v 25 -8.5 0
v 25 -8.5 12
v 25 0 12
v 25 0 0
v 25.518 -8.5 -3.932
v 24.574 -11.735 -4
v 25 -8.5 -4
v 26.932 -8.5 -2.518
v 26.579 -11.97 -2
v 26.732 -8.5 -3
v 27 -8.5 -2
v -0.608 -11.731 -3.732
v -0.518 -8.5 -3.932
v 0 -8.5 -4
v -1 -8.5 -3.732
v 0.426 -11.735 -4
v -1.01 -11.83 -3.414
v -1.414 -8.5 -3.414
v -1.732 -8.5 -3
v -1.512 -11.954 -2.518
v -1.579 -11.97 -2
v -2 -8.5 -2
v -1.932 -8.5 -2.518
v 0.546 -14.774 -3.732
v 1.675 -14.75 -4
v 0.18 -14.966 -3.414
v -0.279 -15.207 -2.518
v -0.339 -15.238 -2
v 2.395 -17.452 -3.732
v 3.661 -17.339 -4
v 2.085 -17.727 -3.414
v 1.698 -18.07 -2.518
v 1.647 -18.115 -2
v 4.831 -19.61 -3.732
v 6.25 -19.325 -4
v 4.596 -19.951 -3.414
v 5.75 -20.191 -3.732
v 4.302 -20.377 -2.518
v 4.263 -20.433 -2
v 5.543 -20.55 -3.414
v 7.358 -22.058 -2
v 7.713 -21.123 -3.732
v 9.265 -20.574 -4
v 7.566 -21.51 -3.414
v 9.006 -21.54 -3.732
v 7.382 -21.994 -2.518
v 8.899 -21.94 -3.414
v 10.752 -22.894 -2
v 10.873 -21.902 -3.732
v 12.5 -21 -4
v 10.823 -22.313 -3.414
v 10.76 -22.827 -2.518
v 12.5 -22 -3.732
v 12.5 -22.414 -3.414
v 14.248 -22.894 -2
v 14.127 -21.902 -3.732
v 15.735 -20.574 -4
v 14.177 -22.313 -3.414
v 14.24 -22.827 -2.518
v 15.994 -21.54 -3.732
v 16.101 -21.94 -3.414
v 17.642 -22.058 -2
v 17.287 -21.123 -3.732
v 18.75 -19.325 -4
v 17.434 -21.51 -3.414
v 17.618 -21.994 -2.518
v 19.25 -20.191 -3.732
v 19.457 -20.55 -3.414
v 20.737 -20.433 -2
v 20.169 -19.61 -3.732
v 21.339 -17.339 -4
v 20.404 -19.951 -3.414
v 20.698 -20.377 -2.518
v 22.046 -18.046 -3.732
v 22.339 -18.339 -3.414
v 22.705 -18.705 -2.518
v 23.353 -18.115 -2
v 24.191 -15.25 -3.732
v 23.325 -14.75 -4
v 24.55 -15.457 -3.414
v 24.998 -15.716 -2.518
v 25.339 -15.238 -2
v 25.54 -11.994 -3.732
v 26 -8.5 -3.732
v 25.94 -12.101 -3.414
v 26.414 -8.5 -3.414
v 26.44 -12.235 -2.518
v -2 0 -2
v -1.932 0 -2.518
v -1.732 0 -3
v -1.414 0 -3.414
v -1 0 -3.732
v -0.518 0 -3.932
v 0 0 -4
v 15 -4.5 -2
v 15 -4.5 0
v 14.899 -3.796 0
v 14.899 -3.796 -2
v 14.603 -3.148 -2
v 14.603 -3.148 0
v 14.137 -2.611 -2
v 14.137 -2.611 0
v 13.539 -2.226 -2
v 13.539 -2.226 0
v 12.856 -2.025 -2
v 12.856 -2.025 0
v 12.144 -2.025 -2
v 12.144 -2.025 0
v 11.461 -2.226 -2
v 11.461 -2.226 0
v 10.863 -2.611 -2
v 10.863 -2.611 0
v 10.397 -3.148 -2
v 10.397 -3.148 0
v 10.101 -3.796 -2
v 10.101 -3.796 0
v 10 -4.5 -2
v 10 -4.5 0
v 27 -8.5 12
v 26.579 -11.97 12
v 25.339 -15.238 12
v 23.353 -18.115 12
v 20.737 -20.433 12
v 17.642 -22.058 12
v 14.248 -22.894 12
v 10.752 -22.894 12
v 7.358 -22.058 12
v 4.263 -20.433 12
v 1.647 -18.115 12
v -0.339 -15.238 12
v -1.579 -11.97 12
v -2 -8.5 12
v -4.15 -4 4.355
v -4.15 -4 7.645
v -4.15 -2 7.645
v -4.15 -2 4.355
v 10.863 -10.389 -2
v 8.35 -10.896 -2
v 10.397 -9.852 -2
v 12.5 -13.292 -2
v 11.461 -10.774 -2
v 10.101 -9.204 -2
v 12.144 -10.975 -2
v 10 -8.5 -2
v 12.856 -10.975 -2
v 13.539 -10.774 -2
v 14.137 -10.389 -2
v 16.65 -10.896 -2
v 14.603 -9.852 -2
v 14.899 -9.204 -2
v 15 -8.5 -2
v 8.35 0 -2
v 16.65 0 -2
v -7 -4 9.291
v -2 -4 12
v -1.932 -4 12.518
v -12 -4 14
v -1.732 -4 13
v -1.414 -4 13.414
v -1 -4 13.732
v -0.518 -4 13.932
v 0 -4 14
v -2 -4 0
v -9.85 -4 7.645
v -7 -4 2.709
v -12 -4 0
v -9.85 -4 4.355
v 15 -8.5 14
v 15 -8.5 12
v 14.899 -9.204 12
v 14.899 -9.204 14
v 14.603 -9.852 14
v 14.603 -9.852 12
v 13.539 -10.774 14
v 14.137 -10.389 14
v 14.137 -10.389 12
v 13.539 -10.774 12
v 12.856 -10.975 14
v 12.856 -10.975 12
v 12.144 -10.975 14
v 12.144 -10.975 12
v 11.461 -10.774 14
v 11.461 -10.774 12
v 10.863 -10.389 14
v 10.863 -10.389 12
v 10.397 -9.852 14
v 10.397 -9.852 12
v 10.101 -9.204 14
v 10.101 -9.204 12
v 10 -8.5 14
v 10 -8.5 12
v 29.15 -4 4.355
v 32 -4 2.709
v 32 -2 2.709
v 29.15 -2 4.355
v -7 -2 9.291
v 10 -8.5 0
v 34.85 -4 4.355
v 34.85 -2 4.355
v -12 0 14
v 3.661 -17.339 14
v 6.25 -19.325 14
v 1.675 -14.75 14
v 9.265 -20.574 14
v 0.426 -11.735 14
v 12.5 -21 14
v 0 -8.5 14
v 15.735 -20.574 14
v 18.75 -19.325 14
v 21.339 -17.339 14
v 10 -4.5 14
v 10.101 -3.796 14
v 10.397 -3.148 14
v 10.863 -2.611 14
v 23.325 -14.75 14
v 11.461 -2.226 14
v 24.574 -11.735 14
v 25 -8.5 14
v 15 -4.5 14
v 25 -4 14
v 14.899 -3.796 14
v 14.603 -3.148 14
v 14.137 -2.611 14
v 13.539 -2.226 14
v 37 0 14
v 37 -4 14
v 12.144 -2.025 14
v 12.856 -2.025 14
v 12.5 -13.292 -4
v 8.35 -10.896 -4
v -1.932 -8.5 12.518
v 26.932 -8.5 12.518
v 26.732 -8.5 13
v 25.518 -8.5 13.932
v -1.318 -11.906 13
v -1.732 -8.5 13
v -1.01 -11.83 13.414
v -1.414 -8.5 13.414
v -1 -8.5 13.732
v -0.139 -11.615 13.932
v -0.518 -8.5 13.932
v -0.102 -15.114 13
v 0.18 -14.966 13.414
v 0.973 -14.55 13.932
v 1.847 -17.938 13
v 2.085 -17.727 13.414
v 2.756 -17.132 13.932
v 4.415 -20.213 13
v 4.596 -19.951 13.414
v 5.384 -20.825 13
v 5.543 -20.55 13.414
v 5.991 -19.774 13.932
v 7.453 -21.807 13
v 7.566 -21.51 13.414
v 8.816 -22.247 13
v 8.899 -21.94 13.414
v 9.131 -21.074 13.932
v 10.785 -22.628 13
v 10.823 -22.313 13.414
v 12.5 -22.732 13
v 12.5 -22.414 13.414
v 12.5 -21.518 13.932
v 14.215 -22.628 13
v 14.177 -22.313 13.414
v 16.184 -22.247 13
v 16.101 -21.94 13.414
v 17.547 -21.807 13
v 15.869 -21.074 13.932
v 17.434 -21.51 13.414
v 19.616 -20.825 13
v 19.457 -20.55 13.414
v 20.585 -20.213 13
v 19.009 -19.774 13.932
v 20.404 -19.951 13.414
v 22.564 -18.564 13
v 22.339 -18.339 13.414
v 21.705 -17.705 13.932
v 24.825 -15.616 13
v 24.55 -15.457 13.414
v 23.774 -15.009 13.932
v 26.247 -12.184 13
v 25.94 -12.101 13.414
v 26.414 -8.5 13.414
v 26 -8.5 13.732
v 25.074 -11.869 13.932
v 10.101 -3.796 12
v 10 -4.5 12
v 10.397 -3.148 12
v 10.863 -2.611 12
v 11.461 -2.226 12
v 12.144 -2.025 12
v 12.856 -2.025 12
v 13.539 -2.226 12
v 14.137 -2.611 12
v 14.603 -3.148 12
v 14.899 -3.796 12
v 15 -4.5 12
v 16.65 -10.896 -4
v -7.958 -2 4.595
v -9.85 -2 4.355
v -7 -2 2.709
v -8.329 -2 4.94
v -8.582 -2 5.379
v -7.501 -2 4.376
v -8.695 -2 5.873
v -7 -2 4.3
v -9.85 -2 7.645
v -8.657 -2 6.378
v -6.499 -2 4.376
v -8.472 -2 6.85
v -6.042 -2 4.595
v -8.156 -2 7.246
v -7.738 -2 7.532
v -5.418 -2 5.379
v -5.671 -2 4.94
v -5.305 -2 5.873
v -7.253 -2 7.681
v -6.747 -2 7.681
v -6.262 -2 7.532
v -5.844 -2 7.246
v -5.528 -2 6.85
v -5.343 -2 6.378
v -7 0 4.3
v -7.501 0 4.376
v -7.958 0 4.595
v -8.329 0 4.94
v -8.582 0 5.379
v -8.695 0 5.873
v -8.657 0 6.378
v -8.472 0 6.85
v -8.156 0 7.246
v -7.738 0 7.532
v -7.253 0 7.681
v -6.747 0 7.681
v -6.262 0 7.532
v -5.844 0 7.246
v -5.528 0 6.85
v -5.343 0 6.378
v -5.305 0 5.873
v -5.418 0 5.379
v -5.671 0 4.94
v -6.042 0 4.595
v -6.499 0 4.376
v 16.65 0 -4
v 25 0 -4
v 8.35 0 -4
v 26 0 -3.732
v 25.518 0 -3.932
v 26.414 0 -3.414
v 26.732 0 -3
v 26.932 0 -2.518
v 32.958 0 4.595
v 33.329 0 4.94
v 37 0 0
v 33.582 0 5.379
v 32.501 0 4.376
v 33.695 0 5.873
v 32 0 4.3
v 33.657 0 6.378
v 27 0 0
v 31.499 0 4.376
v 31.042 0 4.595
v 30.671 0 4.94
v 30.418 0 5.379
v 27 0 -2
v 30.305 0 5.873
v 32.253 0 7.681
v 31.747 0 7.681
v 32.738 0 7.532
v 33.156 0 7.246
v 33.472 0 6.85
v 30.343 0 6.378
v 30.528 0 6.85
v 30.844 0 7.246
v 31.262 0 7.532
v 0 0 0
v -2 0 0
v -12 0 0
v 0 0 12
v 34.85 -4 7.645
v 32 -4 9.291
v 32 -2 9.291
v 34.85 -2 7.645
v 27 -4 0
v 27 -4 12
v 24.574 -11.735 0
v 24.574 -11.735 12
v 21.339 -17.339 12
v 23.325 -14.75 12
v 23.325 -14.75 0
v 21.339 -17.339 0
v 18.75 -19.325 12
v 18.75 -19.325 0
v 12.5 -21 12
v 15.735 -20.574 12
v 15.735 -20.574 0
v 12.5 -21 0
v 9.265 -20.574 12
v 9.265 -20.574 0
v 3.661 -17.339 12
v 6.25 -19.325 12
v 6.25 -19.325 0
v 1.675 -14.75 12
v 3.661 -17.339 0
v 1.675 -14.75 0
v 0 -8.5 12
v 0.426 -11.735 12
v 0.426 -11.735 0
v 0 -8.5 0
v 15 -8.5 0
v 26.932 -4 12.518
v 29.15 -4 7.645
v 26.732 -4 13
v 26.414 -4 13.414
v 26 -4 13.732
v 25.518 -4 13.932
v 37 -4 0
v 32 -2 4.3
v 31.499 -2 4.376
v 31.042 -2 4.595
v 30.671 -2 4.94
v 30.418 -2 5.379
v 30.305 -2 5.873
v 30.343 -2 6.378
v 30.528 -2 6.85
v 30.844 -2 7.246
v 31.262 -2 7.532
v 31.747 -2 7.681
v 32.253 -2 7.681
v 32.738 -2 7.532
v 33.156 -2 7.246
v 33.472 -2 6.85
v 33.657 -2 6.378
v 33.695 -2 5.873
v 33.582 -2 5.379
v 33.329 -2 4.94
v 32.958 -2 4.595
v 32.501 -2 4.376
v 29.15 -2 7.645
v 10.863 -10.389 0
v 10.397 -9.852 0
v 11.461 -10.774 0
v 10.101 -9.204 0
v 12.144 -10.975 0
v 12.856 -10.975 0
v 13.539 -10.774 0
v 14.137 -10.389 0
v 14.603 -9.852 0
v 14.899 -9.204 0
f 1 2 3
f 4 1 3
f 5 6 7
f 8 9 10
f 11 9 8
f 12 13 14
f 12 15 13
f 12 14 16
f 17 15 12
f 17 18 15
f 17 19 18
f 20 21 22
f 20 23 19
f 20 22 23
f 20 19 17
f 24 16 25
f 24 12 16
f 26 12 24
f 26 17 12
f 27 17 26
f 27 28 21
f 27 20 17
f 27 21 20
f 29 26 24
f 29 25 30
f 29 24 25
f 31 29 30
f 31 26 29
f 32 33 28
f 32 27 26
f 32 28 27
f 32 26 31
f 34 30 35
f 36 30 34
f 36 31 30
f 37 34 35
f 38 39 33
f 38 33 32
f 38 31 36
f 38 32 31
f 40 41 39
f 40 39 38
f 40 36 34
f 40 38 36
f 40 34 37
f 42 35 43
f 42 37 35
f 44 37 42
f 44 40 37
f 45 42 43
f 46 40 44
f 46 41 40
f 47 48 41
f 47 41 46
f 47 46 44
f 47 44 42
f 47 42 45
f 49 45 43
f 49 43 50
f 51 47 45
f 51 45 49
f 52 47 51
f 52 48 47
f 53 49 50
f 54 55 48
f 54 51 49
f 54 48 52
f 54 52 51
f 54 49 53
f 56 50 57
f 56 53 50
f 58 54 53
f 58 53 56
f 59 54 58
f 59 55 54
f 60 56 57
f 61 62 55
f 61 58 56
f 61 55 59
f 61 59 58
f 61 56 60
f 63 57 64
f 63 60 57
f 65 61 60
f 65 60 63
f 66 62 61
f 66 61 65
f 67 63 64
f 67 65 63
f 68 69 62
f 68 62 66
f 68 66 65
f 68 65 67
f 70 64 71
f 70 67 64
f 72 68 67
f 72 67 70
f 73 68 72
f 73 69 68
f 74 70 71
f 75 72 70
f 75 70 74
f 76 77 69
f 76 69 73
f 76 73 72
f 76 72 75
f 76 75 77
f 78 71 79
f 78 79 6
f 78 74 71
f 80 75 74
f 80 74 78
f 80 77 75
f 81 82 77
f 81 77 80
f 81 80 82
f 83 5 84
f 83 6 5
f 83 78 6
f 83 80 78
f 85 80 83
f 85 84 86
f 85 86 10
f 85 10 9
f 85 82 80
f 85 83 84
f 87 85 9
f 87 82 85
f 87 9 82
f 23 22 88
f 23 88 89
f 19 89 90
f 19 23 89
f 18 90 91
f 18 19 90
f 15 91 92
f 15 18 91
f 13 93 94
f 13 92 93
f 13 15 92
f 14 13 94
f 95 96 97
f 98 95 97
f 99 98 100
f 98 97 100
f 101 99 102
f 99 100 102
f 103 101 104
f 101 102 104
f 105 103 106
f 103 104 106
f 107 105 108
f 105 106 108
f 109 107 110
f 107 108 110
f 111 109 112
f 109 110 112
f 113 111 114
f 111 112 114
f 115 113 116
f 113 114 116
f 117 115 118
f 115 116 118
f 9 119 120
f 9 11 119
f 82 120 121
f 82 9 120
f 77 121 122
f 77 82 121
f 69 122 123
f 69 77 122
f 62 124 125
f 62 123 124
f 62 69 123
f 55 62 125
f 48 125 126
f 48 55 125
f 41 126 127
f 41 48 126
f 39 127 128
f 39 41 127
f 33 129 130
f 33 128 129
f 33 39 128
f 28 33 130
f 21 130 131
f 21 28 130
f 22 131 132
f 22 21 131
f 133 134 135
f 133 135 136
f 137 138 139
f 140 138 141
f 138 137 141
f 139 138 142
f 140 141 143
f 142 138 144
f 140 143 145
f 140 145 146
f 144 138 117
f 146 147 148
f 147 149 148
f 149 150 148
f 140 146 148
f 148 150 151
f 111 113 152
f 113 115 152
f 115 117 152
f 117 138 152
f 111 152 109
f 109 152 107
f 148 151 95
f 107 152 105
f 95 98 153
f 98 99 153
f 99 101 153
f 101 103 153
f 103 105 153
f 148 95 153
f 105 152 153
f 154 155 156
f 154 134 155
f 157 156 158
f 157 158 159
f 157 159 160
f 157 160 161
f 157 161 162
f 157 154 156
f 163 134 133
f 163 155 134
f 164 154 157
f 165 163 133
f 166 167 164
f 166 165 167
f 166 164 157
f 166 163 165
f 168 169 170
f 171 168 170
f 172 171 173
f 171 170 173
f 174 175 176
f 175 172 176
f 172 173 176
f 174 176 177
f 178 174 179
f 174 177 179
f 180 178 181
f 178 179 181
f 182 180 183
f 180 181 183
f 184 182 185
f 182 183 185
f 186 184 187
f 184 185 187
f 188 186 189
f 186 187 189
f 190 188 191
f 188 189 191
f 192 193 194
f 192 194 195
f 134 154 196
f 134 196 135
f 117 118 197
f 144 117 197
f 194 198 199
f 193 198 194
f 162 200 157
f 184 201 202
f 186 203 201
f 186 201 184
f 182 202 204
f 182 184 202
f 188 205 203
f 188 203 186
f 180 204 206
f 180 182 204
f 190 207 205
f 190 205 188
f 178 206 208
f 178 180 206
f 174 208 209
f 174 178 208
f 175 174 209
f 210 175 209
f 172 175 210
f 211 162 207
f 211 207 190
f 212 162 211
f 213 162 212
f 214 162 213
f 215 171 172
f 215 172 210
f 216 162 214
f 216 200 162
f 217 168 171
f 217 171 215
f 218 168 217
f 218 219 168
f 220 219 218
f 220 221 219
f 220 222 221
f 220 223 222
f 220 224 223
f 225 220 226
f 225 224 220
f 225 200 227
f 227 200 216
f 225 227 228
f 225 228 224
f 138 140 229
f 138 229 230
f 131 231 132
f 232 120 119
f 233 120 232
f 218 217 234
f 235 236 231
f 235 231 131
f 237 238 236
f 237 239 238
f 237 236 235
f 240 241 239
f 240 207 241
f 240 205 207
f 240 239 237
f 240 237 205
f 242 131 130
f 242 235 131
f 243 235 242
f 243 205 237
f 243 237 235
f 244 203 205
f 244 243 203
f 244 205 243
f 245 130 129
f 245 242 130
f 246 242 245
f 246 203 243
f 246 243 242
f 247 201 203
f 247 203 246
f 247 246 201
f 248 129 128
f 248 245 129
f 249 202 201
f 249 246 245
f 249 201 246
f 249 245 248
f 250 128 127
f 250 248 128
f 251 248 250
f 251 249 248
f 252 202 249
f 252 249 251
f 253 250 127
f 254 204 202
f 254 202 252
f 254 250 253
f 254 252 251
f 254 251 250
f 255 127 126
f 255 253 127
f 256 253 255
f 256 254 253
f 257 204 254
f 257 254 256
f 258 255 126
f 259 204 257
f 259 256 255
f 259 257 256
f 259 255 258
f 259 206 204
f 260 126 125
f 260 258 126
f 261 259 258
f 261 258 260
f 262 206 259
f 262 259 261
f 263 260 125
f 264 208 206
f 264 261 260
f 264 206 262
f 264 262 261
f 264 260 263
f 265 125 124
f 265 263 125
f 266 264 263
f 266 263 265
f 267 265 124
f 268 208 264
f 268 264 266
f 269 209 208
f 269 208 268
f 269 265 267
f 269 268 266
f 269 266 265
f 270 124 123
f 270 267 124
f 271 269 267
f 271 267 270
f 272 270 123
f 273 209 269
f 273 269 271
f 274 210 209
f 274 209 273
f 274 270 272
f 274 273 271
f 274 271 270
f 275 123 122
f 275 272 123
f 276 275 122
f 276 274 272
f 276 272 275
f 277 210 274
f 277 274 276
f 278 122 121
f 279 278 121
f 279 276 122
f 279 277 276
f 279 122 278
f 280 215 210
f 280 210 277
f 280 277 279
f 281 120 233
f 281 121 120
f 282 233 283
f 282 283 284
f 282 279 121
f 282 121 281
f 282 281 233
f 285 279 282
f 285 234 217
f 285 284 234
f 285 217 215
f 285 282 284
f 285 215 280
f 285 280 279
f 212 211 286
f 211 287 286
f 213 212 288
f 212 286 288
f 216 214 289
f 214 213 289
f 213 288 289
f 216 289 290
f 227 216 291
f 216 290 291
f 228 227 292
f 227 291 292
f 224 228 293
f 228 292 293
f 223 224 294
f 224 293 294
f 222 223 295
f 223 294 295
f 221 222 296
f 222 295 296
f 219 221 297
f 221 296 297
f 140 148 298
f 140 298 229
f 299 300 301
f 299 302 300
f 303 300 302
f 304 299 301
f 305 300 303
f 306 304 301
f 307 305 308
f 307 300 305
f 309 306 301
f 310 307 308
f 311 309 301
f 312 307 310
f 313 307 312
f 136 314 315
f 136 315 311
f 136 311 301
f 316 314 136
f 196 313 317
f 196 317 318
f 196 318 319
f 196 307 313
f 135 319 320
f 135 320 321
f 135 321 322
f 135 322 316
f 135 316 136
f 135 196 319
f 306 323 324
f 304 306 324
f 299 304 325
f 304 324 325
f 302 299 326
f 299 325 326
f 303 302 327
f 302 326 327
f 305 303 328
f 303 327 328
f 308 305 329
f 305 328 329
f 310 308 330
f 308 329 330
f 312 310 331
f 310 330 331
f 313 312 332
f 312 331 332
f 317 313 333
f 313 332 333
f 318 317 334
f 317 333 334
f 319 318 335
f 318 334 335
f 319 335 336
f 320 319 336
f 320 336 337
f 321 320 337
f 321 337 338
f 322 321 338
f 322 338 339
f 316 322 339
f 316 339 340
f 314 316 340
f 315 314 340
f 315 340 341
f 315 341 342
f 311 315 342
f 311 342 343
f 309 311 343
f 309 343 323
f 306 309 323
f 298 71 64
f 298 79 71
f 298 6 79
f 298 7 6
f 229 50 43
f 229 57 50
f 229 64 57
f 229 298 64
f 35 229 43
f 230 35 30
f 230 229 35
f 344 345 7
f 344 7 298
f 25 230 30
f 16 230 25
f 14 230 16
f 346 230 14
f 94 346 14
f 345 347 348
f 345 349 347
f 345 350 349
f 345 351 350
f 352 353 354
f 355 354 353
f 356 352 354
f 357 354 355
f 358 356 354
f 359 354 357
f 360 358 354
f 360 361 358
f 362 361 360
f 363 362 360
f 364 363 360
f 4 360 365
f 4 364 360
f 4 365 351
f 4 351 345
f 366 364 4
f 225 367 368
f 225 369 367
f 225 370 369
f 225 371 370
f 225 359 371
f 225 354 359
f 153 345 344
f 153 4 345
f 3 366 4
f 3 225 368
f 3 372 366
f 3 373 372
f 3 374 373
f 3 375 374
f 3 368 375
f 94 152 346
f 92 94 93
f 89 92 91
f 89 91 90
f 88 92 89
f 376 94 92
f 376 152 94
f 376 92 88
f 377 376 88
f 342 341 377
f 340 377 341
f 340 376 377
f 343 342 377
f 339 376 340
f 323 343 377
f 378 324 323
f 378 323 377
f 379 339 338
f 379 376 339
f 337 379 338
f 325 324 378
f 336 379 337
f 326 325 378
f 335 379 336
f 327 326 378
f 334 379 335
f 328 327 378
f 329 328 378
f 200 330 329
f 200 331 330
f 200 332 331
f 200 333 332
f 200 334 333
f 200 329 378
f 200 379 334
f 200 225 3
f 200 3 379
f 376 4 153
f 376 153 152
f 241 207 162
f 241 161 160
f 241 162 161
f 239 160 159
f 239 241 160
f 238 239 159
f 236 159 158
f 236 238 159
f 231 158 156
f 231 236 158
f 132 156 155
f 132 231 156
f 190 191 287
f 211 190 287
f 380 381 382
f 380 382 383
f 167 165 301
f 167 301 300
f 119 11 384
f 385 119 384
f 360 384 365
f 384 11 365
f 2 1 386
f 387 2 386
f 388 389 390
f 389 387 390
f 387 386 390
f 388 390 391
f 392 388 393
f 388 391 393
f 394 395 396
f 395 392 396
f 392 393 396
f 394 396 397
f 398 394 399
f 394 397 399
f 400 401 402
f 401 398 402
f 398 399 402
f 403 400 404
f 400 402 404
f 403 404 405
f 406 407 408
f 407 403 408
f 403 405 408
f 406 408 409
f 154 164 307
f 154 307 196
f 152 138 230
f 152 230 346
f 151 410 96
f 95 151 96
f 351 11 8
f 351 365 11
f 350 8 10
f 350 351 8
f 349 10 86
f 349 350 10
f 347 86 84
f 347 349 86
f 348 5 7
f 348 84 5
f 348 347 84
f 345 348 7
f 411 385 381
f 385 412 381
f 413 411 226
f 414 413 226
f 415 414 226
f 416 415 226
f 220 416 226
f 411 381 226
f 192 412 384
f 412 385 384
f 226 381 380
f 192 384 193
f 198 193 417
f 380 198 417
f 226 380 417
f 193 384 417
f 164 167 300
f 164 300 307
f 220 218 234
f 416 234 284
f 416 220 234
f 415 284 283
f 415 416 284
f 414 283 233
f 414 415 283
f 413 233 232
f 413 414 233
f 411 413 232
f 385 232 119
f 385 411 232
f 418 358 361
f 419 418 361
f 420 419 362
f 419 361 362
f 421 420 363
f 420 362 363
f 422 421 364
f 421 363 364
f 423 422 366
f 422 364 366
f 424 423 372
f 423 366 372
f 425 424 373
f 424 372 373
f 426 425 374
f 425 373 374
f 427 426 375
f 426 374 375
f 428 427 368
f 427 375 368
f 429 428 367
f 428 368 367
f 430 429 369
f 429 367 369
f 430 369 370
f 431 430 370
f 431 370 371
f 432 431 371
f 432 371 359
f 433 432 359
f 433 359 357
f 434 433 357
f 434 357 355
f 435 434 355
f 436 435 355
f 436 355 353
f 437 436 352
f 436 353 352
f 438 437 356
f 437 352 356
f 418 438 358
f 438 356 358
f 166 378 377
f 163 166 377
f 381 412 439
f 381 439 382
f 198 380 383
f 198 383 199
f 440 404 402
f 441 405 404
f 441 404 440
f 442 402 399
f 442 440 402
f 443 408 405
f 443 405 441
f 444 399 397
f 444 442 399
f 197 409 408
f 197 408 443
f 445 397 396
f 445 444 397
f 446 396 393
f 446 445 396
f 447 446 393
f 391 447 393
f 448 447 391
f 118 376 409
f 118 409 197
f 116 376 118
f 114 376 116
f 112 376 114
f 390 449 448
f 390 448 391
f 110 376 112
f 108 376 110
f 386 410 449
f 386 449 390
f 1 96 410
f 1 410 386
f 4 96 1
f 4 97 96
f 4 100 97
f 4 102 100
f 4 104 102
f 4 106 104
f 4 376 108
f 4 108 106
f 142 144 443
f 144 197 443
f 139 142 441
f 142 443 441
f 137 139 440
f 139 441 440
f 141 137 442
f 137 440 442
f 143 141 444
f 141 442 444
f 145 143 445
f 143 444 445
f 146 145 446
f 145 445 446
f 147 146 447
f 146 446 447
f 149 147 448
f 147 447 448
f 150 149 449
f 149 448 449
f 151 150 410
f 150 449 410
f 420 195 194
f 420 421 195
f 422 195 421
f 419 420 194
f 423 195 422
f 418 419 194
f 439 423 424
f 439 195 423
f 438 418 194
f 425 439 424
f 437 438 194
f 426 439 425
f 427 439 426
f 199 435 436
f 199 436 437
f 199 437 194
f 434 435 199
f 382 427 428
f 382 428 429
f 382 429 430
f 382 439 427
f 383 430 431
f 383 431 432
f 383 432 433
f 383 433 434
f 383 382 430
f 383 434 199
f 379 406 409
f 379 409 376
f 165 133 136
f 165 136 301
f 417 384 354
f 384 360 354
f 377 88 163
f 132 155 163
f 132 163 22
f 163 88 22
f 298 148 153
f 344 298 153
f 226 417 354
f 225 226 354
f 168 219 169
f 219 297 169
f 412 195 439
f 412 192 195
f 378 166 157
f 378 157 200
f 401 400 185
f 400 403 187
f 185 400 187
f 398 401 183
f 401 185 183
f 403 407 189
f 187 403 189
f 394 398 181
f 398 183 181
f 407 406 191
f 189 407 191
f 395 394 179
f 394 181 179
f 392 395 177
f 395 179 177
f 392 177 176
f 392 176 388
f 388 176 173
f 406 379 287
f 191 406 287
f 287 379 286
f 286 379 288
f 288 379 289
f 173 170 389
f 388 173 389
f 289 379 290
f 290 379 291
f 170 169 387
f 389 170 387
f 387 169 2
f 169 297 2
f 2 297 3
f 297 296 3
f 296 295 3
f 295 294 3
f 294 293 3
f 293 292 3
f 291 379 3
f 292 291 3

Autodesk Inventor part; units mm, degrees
ref_plane "YZ Plane" through (0, 0, 0) normal (1, 0, 0) x (0, 1, 0)
ref_plane "XZ Plane" through (0, 0, 0) normal (0, 1, 0) x (-1, 0, 0)
ref_plane "XY Plane" through (0, 0, 0) normal (0, 0, 1) x (1, 0, 0)
sketch "Sketch1" plane through (0, 0, 0) normal (0, 0, 1) x (1, 0, 0)
  line L0 (25, 0) -> (25, 4) projected
  line L1 (0, 4) -> (25, 4) projected
  line L2 (0, 0) -> (0, 4) projected
  line L3 (16.65, -10.896) -> (12.5, -13.292)
  line L4 (12.5, -13.292) -> (8.35, -10.896)
  line L5 (8.35, -10.896) -> (8.35, -6.104)
  line L6 (16.65, -6.104) -> (16.65, -10.896)
  line L7 (8.35, -6.104) -> (8.35, 0)
  line L8 (16.65, -6.104) -> (16.65, 0)
  line L9 (25, -8.5) -> (25, 0)
  line L10 (0, -8.5) -> (0, 0)
  arc A0 (0, -8.5) -> (25, -8.5) centre (12.5, -8.5) ccw
  line L11 (10, -4.5) -> (10, -8.5)
  line L12 (15, -8.5) -> (15, -4.5)
  arc A1 (15, -4.5) -> (10, -4.5) centre (12.5, -4.5) ccw
  arc A2 (10, -8.5) -> (15, -8.5) centre (12.5, -8.5) ccw
  line L13 (-2, 0) -> (-2, -8.5)
  arc A3 (-2, -8.5) -> (27, -8.5) centre (12.5, -8.5) ccw
  line L14 (27, -8.5) -> (27, 0)
  line L15 (0, 0) -> (-2, 0)
  line L16 (-2, 0) -> (-5.3, 0)
  line L17 (-2, -4) -> (-12, -4)
  line L18 (-12, -4) -> (-12, 0)
  line L19 (-12, 0) -> (-8.7, 0)
  line L20 (27, -4) -> (37, -4)
  line L21 (37, -4) -> (37, 0)
  line L22 (37, 0) -> (33.7, 0)
  line L23 (25, 0) -> (27, 0)
  line L24 (27, 0) -> (30.3, 0)
  line L25 (25, 0) -> (16.65, 0)
  line L26 (8.35, 0) -> (16.65, 0)
  line L27 (8.35, 0) -> (0, 0)
  line L28 (33.7, 0) -> (30.3, 0) projected
  line L29 (-5.3, 0) -> (-8.7, 0) projected
  line L30 (32, 0) -> (32, -6.5) construction
  line L31 (-7, 0) -> (-7, -7.118) construction
  dimension "d5" = 8.3
  dimension "d7" = 5
  dimension "d8" = 2
  dimension "d9" = 4
  dimension "d10" = 4
  dimension "d13" = 8.5
  dimension "d14" = 12.5
extrude "Extrusion1" add sketch "Sketch1" along normal blind 12 contours L23 L14 A3 L13 L15 L10 A0 L9 | L24 L28 L22 L21 L20 L14 | L13 L17 L18 L19 L29 L16
sketch "Sketch2" plane through (0, 0, 0) normal (0, 0, -1) x (-1, 0, 0)
  line L0 (-25, 0) -> (-25, -8.5) projected
  arc A0 (-25, -8.5) -> (0, -8.5) centre (-12.5, -8.5) ccw projected
  line L1 (0, -8.5) -> (0, 0) projected
  line L2 (-27, -8.5) -> (-27, 0) projected
  arc A1 (-27, -8.5) -> (2, -8.5) centre (-12.5, -8.5) ccw projected
  line L3 (2, 0) -> (2, -8.5) projected
  line L4 (-8.35, -6.104) -> (-8.35, 0) projected
  line L5 (-8.35, -10.896) -> (-8.35, -6.104) projected
  line L6 (-12.5, -13.292) -> (-8.35, -10.896) projected
  line L7 (-16.65, -10.896) -> (-12.5, -13.292) projected
  line L8 (-16.65, -6.104) -> (-16.65, -10.896) projected
  line L9 (-16.65, -6.104) -> (-16.65, 0) projected
  line L10 (-15, -8.5) -> (-15, -4.5) projected
  arc A2 (-10, -4.5) -> (-15, -4.5) centre (-12.5, -4.5) ccw projected
  line L11 (-10, -4.5) -> (-10, -8.5) projected
  arc A3 (-15, -8.5) -> (-10, -8.5) centre (-12.5, -8.5) ccw projected
  line L12 (-245.5, 0) -> (14.5, 0) projected
extrude "Extrusion2" add sketch "Sketch2" along normal blind 4 contours L12 L9 L8 L7 L6 L5 L4 L1 A0 L0 | L0 A0 L1 L12 L3 A1 L2
sketch "Sketch3" plane through (0, 0, 0) normal (0, 0, 1) x (1, 0, 0)
  line L0 (8.35, 0) -> (8.35, -10.896) projected
  line L1 (12.5, -13.292) -> (8.35, -10.896) projected
  line L2 (12.5, -13.292) -> (16.65, -10.896) projected
  line L3 (16.65, -10.896) -> (16.65, 0) projected
  line L4 (15, -8.5) -> (15, -4.5) projected
  arc A0 (10, -8.5) -> (15, -8.5) centre (12.5, -8.5) ccw projected
  line L5 (10, -4.5) -> (10, -8.5) projected
  arc A1 (15, -4.5) -> (10, -4.5) centre (12.5, -4.5) ccw projected
  line L6 (92, 0) -> (245.5, 0) projected
  line L7 (245.5, 0) -> (-14.5, 0) projected
  point P0 (0, 0)
extrude "Extrusion3" add sketch "Sketch3" against normal blind 2
sketch "Sketch4" plane through (0, 0, 12) normal (0, 0, 1) x (1, 0, 0)
  arc A0 (15, -4.5) -> (10, -4.5) centre (12.5, -4.5) ccw projected
  line L0 (10, -8.5) -> (10, -4.5) projected
  arc A1 (10, -8.5) -> (15, -8.5) centre (12.5, -8.5) ccw projected
  line L1 (15, -4.5) -> (15, -8.5) projected
  line L2 (25, 0) -> (25, -8.5) projected
  arc A2 (0, -8.5) -> (25, -8.5) centre (12.5, -8.5) ccw projected
  line L3 (0, -8.5) -> (0, 0) projected
  line L4 (0, 0) -> (-12, 0) projected
  line L5 (-12, 0) -> (-12, -4) projected
  line L6 (-12, -4) -> (-2, -4) projected
  line L7 (-2, -4) -> (-2, -8.5) projected
  arc A3 (-2, -8.5) -> (27, -8.5) centre (12.5, -8.5) ccw projected
  line L8 (27, -8.5) -> (27, -4) projected
  line L9 (27, -4) -> (37, -4) projected
  line L10 (37, -4) -> (37, 0) projected
  line L11 (37, 0) -> (25, 0) projected
  line L12 (25, 0) -> (0, 0) projected
  line L13 (-2, -8.5) -> (-2, -4) projected
  line L14 (-2, -4) -> (-2, 0)
  line L15 (27, 0) -> (27, -8.5) projected
  line L16 (27, -4) -> (27, 0)
extrude "Extrusion4" add sketch "Sketch4" along normal blind 2
fillet "Fillet1" radius 2 6 edges at (27, -6.25, 14) (-2, -6.25, 14) (12.5, -23, 14) (-2, -4.25, -4) (27, -4.25, -4) (12.5, -23, -4)
sketch "Sketch5" plane through (27, -4, 0) normal (0, -1, 0) x (1, 0, 0)
  line L0 (7.85, 7.6454) -> (7.85, 4.3546)
  line L1 (7.85, 4.3546) -> (5, 2.7091)
  line L2 (5, 2.7091) -> (2.15, 4.3546)
  line L3 (2.15, 4.3546) -> (2.15, 7.6454)
  line L4 (2.15, 7.6454) -> (5, 9.2909)
  line L5 (5, 9.2909) -> (7.85, 7.6454)
  line L6 (-31.15, 7.6454) -> (-31.15, 4.3546)
  line L7 (-31.15, 4.3546) -> (-34, 2.7091)
  line L8 (-34, 2.7091) -> (-36.85, 4.3546)
  line L9 (-36.85, 4.3546) -> (-36.85, 7.6454)
  line L10 (-36.85, 7.6454) -> (-34, 9.2909)
  line L11 (-34, 9.2909) -> (-31.15, 7.6454)
  line L12 (10, 0) -> (10, 14) projected
  line L13 (-39, 0) -> (-39, 14) projected
  circle A0 centre (5, 6) radius 1.7
  circle A1 centre (-34, 6) radius 1.7
  point P0 (-27, 0)
  point P1 (10, 12)
  point P2 (-39, 12)
  dimension "d22" = 5.7
  dimension "d23" = 5.7
extrude "Extrusion5" cut sketch "Sketch5" against normal blind 2 contours L0 L1 L2 L3 L4 L5 | L6 L7 L8 L9 L10 L11 | A0 | A1
hole "Hole1" at (32, -4, 6) at (-7, -4, 6) direction (0, 1, 0) diameter 3.4 end through all clearance for "Hex Head Bolt / Nut GOST 12876-67" size "M3" standard "GOST"
properties part number "bearing_holder"
